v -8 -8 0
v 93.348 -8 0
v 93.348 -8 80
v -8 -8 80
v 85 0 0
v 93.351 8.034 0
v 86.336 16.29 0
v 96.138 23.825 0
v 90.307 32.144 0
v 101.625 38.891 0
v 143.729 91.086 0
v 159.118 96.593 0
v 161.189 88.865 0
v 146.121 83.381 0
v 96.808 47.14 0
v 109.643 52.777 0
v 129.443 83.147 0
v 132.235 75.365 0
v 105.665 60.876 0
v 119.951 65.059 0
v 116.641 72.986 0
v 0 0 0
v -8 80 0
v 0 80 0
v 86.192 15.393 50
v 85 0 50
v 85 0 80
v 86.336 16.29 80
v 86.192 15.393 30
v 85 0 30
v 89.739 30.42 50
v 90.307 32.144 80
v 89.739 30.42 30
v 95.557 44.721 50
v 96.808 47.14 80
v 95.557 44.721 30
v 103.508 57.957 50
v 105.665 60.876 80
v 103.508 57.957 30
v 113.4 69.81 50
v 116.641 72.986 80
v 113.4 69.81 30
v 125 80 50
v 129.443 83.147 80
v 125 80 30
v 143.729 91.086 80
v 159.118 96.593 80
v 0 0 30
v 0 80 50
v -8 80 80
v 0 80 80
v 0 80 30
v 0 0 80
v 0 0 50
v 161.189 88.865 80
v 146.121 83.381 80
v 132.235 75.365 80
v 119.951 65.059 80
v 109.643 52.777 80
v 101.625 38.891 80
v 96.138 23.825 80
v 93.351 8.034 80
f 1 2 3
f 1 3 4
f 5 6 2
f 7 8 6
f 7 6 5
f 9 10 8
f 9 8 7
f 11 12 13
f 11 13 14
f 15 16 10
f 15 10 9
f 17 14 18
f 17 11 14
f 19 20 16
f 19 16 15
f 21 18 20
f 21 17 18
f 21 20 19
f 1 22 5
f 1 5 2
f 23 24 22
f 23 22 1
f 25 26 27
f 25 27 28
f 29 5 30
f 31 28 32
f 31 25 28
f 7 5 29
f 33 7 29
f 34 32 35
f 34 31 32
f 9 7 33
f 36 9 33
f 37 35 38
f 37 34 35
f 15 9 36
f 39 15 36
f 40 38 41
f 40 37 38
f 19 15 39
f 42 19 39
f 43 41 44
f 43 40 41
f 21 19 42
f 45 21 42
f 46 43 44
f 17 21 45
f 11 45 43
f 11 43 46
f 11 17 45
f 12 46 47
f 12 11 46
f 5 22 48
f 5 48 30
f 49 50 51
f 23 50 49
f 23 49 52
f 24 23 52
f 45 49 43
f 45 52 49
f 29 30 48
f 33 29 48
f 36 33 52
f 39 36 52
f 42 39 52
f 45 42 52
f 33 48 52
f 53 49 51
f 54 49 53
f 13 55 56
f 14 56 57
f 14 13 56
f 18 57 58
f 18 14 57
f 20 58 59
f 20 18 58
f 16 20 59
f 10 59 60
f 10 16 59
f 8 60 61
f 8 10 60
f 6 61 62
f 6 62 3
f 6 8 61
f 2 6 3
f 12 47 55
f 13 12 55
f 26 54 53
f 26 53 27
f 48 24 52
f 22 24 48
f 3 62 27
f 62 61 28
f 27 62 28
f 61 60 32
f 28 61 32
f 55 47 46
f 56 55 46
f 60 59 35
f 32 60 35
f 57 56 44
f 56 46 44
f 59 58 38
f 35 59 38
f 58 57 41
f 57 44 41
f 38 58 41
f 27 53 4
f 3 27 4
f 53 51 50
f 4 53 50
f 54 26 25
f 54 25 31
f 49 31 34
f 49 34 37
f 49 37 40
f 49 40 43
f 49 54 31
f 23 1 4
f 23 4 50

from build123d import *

# Parameters (mm, degrees)
EXTRUDE_THIN1_DEPTH = 80
BOSS_EXTRUDE1_REACH = 163.189
SKETCH2_W           = 20
SKETCH2_H           = 80


with BuildPart() as part:
    # Sketch1 → Extrude-Thin1 (new body)
    with BuildSketch(Plane.XY):
        with BuildLine():
            Line((0, 80), (0, 0))
            Line((0, 0), (85, 0))
            ThreePointArc((85, 0), (105.664665971, 60.876142901), (159.11809549, 96.592582629))
            Line((159.11809549, 96.592582629), (161.188647851, 88.865176019))
            ThreePointArc((161.188647851, 88.865176019), (109.643288684, 52.776567335), (93.348486101, -8))
            Line((93.348486101, -8), (-8, -8))
            Line((-8, -8), (-8, 80))
            Line((-8, 80), (0, 80))
        make_face()
    extrude(amount=EXTRUDE_THIN1_DEPTH)

    # Sketch2 → Boss-Extrude1 (add, up to next)
    with BuildSketch(Plane(origin=(0, 0, 0), x_dir=(0, 0, -1), z_dir=(1, 0, 0)), mode=Mode.PRIVATE) as boss_extrude1_sk1:
        with Locations((-40, 40)):
            Rectangle(SKETCH2_W, SKETCH2_H)
    boss_extrude1_tool1 = extrude(boss_extrude1_sk1.sketch, amount=BOSS_EXTRUDE1_REACH, mode=Mode.PRIVATE) - part.part
    add(boss_extrude1_tool1.solids().sort_by_distance((0, 40, 40))[0])


solid = part.part
